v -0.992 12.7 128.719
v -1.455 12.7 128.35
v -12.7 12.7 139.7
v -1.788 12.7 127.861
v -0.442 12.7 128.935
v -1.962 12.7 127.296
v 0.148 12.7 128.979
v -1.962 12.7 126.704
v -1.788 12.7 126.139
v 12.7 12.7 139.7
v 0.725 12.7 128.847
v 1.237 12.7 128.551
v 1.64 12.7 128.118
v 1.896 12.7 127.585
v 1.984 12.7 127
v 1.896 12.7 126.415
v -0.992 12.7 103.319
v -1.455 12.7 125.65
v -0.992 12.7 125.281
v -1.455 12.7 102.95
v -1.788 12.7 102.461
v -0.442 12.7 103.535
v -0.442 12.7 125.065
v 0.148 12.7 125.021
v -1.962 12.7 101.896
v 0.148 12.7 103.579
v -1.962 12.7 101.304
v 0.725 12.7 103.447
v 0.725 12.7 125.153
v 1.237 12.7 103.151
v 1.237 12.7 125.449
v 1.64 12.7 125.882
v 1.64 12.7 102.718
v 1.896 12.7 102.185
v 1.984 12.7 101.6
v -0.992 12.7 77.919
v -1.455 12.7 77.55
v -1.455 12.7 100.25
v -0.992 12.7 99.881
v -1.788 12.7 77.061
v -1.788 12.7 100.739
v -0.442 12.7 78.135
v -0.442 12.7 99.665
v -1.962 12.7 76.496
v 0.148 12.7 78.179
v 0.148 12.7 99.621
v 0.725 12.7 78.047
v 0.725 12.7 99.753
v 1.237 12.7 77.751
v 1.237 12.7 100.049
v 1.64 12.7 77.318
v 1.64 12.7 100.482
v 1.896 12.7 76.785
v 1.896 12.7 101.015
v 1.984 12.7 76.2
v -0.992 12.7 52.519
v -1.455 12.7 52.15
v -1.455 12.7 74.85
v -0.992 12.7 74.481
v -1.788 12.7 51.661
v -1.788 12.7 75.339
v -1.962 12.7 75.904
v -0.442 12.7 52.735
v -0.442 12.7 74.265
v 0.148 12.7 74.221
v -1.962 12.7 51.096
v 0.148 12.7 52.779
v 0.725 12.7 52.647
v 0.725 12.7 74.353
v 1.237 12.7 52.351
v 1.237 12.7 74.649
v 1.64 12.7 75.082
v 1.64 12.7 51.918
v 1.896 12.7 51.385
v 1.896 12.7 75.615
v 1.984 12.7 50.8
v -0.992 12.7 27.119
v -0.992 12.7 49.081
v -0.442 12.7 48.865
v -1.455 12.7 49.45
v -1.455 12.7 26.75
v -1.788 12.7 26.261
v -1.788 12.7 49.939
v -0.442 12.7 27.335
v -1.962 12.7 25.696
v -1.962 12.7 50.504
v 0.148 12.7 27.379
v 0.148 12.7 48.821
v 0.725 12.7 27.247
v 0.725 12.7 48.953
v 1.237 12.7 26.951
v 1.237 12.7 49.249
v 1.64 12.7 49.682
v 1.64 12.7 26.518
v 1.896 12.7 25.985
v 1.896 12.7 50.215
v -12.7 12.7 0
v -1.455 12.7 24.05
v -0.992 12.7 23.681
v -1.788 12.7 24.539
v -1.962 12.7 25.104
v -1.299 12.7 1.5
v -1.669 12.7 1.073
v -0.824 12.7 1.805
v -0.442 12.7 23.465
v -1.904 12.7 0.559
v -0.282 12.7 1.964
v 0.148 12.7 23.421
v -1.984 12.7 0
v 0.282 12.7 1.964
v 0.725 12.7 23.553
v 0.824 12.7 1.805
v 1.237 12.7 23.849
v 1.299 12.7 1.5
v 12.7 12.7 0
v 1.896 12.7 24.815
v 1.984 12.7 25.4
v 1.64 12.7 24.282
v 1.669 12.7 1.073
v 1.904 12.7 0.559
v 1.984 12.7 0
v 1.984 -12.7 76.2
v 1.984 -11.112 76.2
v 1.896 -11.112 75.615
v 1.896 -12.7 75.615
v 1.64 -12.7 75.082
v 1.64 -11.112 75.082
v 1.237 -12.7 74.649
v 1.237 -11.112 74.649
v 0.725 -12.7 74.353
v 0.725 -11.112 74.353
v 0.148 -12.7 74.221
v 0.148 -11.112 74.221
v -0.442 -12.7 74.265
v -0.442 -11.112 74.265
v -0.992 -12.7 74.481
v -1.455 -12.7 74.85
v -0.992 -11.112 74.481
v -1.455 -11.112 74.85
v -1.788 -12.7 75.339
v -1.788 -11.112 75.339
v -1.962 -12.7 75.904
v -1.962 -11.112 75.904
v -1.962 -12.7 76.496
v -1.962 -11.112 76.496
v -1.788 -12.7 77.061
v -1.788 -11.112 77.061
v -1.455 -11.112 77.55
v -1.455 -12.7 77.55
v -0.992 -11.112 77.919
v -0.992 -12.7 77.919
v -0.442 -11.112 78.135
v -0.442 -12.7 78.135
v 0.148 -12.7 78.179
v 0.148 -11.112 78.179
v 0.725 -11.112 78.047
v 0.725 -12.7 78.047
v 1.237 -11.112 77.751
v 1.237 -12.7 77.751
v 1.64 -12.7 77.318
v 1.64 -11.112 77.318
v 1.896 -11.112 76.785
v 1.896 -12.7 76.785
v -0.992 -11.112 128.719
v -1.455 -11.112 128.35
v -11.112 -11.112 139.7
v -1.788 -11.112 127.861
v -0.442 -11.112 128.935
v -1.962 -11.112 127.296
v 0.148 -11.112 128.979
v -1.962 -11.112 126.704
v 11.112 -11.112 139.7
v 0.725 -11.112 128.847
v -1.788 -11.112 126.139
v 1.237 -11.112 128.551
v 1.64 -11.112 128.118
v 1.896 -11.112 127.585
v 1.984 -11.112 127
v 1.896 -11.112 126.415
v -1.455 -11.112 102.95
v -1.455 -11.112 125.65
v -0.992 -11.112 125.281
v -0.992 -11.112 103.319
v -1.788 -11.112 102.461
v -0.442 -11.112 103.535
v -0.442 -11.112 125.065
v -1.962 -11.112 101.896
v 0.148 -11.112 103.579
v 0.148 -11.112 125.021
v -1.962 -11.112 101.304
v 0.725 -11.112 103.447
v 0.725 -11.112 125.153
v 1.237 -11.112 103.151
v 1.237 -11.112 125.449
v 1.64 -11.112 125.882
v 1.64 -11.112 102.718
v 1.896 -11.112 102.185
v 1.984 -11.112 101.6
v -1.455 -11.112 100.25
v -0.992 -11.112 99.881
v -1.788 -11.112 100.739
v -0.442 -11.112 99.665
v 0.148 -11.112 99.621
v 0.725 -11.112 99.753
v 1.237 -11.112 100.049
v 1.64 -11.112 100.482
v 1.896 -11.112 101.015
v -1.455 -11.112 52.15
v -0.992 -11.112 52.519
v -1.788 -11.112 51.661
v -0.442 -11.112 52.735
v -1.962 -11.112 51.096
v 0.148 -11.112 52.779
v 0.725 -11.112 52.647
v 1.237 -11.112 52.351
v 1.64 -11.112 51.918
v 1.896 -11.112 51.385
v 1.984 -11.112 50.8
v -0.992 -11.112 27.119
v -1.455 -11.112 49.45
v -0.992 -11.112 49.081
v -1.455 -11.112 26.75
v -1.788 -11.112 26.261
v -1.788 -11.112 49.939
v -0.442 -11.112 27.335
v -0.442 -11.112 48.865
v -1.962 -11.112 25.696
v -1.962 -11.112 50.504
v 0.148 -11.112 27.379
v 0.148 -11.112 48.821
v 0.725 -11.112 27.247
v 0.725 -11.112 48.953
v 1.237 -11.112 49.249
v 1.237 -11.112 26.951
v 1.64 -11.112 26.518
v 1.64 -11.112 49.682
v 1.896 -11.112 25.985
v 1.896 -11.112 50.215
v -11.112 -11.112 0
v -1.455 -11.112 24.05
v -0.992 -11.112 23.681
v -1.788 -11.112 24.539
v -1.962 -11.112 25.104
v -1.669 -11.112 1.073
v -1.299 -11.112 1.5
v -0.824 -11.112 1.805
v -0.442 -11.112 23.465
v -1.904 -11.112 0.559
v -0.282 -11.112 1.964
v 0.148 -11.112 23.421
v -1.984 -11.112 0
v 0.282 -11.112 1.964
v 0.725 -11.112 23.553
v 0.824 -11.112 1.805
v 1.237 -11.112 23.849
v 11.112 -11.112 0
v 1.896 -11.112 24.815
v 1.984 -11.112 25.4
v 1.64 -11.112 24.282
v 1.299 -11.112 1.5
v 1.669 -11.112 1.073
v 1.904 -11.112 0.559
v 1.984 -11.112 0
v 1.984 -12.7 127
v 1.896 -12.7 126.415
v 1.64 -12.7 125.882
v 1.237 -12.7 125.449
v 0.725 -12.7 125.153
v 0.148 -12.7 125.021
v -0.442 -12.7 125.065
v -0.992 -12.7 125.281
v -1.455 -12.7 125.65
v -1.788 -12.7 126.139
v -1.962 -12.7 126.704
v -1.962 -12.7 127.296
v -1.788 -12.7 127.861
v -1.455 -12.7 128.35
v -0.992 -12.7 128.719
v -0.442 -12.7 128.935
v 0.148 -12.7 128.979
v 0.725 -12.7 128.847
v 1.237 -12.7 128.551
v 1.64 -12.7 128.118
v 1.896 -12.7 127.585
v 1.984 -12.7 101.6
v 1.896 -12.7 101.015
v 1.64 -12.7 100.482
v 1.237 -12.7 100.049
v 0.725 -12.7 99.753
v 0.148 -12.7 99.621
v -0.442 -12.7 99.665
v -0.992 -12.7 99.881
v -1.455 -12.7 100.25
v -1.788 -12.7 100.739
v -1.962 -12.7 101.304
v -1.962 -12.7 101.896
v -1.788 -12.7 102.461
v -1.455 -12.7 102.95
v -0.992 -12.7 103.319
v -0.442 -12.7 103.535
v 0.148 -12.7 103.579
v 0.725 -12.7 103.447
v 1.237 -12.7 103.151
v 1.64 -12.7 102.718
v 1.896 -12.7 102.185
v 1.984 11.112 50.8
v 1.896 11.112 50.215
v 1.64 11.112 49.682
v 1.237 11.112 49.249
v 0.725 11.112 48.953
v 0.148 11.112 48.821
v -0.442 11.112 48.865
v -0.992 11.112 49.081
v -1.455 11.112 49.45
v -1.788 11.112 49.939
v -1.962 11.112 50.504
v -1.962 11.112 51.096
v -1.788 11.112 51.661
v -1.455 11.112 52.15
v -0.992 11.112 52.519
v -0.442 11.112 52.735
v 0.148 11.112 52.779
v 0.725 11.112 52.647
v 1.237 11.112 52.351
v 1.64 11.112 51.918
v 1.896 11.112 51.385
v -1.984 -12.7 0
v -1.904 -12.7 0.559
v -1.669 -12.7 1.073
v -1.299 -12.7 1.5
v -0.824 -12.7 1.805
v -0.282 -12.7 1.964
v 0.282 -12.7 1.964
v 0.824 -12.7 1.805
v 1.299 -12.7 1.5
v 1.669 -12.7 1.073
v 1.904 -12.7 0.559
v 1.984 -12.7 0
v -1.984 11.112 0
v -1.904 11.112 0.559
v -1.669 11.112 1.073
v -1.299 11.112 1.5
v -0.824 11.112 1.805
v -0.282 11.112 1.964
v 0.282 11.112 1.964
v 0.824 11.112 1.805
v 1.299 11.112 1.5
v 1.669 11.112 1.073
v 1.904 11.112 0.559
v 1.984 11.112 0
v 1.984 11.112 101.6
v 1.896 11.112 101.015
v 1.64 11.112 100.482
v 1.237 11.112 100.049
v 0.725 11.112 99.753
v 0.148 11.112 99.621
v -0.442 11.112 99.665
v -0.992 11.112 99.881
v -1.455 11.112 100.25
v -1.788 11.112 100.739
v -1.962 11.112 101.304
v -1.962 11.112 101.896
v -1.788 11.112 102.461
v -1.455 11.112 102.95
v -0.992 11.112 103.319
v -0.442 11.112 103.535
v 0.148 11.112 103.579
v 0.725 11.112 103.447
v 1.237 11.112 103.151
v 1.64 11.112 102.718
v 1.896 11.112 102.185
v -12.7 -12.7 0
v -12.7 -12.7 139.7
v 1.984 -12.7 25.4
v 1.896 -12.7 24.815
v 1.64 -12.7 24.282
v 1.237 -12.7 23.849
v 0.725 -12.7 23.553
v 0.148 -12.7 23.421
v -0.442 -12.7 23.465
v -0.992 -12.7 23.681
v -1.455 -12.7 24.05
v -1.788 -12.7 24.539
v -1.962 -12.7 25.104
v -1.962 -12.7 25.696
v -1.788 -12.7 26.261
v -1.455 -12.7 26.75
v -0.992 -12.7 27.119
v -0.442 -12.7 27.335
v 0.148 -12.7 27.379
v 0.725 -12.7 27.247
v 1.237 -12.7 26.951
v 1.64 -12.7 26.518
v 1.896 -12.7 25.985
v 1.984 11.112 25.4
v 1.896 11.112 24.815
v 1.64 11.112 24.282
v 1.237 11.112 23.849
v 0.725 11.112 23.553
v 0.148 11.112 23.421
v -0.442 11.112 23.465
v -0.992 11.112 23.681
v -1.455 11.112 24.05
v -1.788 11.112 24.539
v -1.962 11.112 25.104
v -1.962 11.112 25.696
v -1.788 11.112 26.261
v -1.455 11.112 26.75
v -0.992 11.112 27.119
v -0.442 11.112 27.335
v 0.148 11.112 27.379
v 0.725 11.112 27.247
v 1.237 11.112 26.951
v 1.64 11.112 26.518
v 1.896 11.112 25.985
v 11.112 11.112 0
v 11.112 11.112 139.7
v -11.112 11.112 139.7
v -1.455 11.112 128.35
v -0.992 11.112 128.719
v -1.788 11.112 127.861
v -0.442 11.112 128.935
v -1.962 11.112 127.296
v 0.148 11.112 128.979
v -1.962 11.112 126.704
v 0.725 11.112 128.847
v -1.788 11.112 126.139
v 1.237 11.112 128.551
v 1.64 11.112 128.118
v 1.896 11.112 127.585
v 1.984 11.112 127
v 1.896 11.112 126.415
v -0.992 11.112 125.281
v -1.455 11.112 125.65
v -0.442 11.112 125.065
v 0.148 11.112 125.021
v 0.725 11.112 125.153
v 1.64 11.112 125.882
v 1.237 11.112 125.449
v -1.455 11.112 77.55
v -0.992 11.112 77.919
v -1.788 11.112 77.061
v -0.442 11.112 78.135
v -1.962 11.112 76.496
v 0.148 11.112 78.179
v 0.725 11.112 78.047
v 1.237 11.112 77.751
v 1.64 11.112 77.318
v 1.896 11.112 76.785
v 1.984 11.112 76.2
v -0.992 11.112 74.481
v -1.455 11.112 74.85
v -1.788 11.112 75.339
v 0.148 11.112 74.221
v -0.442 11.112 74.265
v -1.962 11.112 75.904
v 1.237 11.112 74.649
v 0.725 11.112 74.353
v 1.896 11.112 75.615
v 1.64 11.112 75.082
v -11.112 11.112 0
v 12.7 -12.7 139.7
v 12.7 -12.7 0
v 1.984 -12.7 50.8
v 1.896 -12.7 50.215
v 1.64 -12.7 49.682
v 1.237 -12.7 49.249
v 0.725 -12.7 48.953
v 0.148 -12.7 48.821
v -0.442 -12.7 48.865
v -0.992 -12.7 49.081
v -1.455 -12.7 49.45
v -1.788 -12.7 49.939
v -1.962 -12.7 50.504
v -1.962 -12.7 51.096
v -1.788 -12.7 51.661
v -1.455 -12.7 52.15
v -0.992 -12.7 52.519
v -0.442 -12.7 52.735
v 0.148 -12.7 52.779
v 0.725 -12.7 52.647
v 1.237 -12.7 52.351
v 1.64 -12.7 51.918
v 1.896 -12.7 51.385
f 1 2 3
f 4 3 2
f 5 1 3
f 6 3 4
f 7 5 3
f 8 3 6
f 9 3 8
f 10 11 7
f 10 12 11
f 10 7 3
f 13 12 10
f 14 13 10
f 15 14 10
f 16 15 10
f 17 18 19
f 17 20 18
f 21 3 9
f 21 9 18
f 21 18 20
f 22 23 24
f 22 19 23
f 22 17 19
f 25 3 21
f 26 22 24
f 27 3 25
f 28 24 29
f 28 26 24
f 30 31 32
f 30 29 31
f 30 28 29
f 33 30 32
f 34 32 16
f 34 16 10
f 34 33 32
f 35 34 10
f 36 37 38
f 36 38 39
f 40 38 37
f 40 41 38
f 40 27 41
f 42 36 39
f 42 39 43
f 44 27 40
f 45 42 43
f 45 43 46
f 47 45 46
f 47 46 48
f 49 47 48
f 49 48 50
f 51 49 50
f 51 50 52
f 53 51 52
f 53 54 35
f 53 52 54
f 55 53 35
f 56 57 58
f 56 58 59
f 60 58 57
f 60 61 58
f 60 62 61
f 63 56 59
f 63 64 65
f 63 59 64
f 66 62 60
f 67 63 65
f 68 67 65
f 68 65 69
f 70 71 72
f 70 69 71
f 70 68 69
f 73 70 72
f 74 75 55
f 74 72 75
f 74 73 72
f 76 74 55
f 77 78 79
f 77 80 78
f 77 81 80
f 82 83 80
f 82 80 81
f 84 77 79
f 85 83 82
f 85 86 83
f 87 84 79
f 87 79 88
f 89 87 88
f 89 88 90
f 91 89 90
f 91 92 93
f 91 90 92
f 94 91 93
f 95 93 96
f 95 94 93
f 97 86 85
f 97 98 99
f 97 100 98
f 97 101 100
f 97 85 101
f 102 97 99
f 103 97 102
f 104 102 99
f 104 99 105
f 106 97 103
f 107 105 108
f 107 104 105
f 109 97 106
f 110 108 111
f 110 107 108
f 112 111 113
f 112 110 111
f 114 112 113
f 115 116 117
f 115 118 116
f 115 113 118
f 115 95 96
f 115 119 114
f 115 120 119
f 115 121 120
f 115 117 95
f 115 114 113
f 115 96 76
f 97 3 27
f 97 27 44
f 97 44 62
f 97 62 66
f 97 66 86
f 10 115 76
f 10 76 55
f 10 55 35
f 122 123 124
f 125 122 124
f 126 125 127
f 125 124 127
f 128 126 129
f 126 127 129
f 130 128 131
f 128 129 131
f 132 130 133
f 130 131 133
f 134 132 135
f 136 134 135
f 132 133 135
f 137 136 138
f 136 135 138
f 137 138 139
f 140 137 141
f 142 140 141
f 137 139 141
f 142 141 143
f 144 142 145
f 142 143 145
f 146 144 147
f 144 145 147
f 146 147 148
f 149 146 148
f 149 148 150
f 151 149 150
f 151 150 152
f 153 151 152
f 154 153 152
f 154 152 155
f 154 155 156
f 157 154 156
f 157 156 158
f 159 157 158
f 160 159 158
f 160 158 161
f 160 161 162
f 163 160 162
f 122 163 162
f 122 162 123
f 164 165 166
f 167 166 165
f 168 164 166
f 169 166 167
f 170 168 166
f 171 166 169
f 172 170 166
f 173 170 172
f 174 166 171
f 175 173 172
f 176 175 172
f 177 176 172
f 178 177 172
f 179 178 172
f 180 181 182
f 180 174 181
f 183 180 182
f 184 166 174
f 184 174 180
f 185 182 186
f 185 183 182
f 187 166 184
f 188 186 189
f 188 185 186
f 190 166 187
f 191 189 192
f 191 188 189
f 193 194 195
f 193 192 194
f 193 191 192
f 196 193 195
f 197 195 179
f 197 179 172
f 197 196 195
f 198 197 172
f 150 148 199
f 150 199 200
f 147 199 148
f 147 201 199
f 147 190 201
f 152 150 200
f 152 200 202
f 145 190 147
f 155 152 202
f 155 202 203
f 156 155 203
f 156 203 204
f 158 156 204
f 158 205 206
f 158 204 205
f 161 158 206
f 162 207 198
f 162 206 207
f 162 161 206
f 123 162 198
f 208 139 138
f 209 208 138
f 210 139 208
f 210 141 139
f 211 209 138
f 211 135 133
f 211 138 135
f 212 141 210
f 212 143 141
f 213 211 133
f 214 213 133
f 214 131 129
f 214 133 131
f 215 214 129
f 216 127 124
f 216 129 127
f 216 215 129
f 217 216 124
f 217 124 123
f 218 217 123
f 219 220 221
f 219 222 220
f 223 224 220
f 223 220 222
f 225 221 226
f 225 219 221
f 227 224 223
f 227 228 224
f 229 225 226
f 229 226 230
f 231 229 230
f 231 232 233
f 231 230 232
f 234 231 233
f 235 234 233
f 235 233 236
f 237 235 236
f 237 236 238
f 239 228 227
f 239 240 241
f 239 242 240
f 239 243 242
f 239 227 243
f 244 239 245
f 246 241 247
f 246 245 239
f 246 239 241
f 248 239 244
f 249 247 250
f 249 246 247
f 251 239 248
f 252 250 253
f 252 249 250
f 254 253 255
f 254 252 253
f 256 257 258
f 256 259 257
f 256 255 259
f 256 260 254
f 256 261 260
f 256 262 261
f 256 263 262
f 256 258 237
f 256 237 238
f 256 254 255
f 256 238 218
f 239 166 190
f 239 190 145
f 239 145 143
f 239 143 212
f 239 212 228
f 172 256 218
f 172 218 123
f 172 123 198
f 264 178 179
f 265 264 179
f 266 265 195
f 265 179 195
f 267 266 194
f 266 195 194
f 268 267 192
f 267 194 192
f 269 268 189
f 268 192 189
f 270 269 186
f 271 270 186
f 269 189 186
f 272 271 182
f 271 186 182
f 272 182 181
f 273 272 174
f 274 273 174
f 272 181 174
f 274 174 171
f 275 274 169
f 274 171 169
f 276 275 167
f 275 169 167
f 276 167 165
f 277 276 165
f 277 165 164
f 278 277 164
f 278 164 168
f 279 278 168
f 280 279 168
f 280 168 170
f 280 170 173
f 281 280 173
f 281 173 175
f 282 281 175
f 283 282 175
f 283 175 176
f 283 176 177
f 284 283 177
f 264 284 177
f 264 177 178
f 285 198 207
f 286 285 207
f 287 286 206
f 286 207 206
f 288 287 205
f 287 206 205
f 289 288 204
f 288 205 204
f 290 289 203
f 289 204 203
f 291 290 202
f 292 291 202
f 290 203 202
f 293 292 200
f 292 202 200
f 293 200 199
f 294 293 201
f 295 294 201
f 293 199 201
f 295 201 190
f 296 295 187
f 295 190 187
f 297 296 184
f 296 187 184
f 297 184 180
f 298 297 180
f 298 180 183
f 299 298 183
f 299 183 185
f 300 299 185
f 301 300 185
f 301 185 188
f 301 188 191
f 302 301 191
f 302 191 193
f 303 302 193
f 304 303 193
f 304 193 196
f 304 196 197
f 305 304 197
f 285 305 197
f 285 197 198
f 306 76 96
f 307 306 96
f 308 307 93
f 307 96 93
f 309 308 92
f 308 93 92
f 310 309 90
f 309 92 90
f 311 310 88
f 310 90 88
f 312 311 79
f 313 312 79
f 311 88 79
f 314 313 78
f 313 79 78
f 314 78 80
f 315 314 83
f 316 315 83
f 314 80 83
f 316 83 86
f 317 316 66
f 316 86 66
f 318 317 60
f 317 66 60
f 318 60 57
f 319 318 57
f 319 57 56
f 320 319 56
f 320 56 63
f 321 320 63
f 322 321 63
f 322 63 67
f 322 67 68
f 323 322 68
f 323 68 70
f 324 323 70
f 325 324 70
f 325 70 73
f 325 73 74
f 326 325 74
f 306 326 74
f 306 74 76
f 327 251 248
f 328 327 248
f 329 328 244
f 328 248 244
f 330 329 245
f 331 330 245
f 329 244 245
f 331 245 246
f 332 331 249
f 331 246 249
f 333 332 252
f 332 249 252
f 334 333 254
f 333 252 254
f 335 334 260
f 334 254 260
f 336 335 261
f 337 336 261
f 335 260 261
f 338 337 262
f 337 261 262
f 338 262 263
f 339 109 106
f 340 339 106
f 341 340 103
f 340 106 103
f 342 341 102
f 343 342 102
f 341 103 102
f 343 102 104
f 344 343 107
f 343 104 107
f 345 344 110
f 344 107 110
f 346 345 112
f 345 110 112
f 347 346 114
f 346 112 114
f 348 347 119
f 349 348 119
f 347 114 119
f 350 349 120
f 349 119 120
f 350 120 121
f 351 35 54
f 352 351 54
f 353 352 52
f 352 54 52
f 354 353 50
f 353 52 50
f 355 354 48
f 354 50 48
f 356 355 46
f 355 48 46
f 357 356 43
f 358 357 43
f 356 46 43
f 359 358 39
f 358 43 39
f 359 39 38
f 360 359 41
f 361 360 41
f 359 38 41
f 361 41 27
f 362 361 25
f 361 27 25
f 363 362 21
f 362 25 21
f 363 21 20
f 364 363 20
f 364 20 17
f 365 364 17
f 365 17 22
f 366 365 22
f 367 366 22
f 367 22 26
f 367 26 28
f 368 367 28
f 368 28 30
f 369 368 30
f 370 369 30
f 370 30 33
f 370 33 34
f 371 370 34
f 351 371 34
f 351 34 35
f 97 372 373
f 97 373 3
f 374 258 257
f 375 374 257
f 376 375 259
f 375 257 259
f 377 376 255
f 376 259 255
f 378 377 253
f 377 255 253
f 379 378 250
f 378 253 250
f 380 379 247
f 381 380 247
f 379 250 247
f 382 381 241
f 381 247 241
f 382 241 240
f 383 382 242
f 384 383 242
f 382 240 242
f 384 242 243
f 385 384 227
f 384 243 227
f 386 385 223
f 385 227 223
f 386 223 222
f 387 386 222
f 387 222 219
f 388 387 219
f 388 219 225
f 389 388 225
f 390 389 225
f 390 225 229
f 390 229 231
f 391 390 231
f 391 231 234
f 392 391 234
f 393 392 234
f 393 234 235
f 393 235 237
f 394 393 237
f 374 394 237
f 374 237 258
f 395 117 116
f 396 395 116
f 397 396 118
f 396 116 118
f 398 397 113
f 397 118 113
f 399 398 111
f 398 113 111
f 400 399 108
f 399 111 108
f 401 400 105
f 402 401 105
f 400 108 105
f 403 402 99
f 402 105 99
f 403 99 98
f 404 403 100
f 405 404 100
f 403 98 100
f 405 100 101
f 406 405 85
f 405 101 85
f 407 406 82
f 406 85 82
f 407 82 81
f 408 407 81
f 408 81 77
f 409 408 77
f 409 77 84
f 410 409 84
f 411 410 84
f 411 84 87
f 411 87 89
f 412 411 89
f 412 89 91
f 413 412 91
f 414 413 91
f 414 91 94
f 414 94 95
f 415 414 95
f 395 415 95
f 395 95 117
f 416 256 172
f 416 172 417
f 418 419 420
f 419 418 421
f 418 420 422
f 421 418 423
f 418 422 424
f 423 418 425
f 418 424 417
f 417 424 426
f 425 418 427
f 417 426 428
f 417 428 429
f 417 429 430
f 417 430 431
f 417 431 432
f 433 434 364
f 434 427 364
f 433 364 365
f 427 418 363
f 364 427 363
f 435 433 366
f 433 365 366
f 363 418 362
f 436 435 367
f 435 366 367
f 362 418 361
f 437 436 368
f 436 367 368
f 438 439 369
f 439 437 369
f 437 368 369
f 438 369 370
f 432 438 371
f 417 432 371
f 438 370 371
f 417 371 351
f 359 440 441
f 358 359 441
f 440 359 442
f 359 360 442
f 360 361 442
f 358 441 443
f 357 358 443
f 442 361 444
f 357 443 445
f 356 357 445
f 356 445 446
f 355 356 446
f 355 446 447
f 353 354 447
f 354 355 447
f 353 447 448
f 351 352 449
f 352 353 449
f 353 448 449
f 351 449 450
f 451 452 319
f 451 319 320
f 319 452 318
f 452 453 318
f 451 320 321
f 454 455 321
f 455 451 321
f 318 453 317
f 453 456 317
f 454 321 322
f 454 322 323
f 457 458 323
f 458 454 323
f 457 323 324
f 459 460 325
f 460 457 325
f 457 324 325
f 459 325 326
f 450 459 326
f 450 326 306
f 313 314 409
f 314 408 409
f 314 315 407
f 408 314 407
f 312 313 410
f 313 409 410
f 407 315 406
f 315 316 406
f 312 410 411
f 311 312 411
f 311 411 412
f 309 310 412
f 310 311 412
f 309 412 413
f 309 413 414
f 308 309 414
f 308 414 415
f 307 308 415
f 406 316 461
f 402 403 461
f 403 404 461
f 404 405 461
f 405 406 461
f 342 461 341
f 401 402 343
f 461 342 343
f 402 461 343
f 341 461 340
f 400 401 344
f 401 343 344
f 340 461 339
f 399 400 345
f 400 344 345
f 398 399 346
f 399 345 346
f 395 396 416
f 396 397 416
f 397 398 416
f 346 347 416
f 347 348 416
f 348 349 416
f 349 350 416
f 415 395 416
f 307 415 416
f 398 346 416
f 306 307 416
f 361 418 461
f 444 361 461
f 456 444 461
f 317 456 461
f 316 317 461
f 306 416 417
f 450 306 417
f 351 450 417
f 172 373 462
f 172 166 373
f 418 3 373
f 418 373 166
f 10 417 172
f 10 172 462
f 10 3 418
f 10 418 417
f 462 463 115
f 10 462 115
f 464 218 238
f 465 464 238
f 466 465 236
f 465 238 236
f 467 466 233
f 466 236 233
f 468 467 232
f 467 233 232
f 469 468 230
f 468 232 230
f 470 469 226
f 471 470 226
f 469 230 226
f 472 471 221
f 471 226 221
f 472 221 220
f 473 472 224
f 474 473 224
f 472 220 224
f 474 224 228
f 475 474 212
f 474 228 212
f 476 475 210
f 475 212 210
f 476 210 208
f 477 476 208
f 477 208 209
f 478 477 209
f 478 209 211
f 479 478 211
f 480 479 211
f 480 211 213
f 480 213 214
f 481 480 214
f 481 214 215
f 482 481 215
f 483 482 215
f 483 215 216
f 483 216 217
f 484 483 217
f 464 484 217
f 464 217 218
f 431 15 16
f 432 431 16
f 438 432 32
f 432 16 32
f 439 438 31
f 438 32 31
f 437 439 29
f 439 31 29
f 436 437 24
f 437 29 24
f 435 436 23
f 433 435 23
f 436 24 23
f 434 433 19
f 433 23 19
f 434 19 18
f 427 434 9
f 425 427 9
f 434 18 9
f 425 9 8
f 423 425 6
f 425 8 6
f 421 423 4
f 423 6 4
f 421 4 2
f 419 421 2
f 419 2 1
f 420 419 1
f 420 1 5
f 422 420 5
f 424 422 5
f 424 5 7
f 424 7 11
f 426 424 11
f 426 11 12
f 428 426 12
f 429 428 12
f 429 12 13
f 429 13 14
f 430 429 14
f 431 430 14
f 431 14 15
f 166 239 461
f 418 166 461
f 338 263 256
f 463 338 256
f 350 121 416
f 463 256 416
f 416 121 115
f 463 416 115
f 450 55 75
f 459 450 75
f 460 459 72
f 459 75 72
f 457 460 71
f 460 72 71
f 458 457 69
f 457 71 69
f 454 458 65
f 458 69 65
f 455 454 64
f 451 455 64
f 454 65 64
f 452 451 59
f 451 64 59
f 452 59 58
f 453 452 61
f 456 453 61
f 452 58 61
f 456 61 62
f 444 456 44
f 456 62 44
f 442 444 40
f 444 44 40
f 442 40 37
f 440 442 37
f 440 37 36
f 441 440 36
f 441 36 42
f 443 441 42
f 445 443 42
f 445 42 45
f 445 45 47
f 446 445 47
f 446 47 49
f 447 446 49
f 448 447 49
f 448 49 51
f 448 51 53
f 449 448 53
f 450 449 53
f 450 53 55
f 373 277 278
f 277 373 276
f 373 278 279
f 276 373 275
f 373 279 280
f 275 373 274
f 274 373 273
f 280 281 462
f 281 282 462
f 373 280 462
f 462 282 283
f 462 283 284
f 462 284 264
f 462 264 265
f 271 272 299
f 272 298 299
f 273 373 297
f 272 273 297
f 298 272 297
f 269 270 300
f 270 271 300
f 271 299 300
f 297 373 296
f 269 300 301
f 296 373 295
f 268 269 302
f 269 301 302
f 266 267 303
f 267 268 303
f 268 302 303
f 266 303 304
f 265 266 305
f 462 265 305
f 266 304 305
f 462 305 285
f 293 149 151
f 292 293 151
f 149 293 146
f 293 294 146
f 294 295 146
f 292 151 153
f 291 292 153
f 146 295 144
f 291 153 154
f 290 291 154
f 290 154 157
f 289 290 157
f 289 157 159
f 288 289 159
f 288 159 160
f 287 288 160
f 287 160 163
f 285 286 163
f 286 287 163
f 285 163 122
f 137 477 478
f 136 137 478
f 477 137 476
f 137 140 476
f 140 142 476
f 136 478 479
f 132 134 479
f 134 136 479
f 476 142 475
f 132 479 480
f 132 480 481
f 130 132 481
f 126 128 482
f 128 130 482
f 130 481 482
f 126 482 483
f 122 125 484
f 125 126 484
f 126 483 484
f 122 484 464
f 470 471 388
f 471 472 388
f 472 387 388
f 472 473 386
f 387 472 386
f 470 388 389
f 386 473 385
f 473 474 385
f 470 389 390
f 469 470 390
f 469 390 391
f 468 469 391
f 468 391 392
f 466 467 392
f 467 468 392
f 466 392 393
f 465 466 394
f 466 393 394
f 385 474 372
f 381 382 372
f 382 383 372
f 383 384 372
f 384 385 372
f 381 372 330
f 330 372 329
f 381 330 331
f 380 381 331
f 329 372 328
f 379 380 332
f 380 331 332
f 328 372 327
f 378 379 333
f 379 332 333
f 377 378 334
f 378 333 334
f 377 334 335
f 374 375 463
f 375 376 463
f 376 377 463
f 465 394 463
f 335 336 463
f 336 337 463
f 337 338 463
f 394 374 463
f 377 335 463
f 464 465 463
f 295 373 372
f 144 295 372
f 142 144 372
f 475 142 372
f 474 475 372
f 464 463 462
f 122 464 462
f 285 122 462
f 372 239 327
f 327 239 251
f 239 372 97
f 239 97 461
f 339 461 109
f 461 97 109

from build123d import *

# Parameters (mm, degrees)
SKETCH1_W           = 25.4
SKETCH1_H           = 25.4
SKETCH1_W_2         = 22.225
SKETCH1_H_2         = 22.225
BOSS_EXTRUDE1_DEPTH = 139.7
SKETCH2_R           = 1.984375
CUT_EXTRUDE1_DEPTH  = 26.4


with BuildPart() as part:
    # Sketch1 → Boss-Extrude1 (new body)
    with BuildSketch(Plane.XY):
        Rectangle(SKETCH1_W, SKETCH1_H)
        Rectangle(SKETCH1_W_2, SKETCH1_H_2, mode=Mode.SUBTRACT)
    extrude(amount=BOSS_EXTRUDE1_DEPTH)

    # Sketch2 → Cut-Extrude1 (cut, through all)
    with BuildSketch(Plane(origin=(0, 12.7, 0), x_dir=(1, 0, 0), z_dir=(0, 1, 0))):
        with Locations((0, -127)):
            Circle(SKETCH2_R)
        with Locations((0, -101.6)):
            Circle(SKETCH2_R)
        with Locations((0, -76.2)):
            Circle(SKETCH2_R)
        with Locations((0, -50.8)):
            Circle(SKETCH2_R)
        with Locations((0, -25.4)):
            Circle(SKETCH2_R)
        Circle(SKETCH2_R)
        with Locations((0, 25.4)):
            Circle(SKETCH2_R)
        with Locations((0, 50.8)):
            Circle(SKETCH2_R)
        with Locations((0, 76.2)):
            Circle(SKETCH2_R)
        with Locations((0, 101.6)):
            Circle(SKETCH2_R)
        with Locations((0, 127)):
            Circle(SKETCH2_R)
        with Locations((0, 152.4)):
            Circle(SKETCH2_R)
    extrude(amount=-CUT_EXTRUDE1_DEPTH, mode=Mode.SUBTRACT)


solid = part.part
